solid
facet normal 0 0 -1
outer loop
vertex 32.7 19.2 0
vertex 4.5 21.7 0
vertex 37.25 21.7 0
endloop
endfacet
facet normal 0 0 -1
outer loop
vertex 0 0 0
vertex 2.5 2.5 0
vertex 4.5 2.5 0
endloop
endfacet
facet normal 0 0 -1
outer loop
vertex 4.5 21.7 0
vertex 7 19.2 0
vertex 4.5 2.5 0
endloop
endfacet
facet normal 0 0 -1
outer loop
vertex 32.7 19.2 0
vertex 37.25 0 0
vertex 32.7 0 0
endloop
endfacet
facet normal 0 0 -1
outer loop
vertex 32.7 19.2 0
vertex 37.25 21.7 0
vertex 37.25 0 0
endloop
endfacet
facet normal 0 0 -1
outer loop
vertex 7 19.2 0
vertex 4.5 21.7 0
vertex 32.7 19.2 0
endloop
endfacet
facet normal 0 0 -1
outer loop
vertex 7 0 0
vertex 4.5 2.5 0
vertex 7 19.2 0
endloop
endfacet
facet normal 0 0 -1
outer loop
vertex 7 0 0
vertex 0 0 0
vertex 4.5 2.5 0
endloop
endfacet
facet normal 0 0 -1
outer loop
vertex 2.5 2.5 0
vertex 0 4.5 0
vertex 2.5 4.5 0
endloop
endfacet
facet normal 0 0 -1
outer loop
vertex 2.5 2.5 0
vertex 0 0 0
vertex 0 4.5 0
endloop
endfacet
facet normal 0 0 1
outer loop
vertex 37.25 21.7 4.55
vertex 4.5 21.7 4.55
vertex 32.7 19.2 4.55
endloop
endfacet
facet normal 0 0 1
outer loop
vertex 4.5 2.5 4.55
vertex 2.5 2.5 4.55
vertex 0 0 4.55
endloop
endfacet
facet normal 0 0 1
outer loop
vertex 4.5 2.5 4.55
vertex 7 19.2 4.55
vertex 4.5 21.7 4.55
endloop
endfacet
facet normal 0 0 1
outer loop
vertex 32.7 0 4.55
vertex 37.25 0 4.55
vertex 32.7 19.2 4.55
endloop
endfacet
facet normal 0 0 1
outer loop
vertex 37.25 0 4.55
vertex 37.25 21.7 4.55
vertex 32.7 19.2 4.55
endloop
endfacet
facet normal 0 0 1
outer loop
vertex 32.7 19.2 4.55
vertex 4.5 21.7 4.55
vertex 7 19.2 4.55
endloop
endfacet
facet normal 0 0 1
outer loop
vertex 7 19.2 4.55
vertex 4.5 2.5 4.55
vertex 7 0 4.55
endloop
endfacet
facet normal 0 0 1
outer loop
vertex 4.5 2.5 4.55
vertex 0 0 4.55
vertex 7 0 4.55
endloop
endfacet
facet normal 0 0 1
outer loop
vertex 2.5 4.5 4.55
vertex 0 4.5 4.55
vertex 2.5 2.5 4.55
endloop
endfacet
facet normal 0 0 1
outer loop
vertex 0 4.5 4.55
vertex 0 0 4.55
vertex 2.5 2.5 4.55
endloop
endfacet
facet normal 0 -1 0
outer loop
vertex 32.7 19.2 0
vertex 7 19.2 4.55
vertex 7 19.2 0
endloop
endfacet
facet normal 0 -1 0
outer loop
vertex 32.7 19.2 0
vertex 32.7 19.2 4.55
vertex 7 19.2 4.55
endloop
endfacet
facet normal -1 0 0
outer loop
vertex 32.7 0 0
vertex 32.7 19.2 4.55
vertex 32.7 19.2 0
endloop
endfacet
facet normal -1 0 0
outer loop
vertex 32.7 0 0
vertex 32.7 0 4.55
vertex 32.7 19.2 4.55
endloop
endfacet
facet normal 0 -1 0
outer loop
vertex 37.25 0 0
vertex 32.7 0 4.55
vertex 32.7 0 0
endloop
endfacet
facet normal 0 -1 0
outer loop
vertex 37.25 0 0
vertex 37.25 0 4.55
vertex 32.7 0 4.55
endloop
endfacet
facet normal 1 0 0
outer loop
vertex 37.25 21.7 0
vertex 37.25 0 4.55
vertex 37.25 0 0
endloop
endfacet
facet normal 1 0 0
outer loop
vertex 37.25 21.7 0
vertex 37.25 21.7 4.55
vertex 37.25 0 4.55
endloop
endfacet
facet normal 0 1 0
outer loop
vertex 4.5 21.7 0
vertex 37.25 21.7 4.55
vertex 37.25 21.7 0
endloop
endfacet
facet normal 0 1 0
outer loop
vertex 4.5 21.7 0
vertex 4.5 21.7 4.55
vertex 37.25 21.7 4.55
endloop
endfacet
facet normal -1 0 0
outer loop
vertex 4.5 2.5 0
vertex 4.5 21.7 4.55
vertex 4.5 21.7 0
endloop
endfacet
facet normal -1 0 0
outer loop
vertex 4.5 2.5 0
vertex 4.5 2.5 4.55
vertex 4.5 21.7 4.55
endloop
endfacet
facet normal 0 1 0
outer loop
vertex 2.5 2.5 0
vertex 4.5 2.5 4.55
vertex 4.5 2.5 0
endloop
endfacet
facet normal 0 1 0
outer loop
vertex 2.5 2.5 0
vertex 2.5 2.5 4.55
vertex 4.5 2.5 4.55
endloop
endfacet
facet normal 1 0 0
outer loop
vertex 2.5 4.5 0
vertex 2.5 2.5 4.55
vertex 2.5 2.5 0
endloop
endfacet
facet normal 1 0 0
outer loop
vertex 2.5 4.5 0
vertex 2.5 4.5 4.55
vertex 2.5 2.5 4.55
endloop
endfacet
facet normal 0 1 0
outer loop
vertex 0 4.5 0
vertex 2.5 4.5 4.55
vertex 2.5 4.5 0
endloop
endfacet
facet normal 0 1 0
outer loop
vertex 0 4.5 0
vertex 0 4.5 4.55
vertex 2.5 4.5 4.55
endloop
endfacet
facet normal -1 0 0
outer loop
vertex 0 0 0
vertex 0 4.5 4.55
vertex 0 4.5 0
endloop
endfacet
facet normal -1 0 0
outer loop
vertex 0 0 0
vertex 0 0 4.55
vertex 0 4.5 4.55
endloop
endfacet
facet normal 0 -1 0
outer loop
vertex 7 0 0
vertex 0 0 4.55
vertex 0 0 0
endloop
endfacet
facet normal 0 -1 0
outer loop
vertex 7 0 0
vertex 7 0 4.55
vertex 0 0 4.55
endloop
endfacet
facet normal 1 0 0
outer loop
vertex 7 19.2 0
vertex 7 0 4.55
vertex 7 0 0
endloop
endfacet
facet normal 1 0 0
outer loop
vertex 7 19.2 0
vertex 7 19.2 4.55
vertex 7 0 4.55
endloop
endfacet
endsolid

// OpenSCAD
// created by IndiePandaaaaa|Lukas

THICKNESS = 2.5;
TOLERANCE = .15;
$fn = 75;

HOOK_WIDTH_INSIDE = 2;
PLATSA_SIDE_WALL_OFFSET = 25.7; // 25.7 for side hook, 42.5 for door closing
PLATSA_MOUNTING_WIDTH = 4.7 - TOLERANCE;
PLATSA_MOUNTING_DEPTH = 19.2;

linear_extrude(PLATSA_MOUNTING_WIDTH) {
  polygon([
    [0, 0],
    [THICKNESS * 2 + HOOK_WIDTH_INSIDE, 0],
    [THICKNESS * 2 + HOOK_WIDTH_INSIDE, PLATSA_MOUNTING_DEPTH],
    [THICKNESS * 2 + HOOK_WIDTH_INSIDE + PLATSA_SIDE_WALL_OFFSET, PLATSA_MOUNTING_DEPTH],
    [THICKNESS * 2 + HOOK_WIDTH_INSIDE + PLATSA_SIDE_WALL_OFFSET, 0],
    [THICKNESS * 2 + HOOK_WIDTH_INSIDE + PLATSA_SIDE_WALL_OFFSET + PLATSA_MOUNTING_WIDTH, 0],
    [THICKNESS * 2 + HOOK_WIDTH_INSIDE + PLATSA_SIDE_WALL_OFFSET + PLATSA_MOUNTING_WIDTH, PLATSA_MOUNTING_DEPTH + THICKNESS],
    [THICKNESS + HOOK_WIDTH_INSIDE, PLATSA_MOUNTING_DEPTH + THICKNESS],
    [THICKNESS + HOOK_WIDTH_INSIDE, THICKNESS],
    [THICKNESS, THICKNESS],
    [THICKNESS, THICKNESS + HOOK_WIDTH_INSIDE],
    [0, THICKNESS + HOOK_WIDTH_INSIDE],
  ]);
}
